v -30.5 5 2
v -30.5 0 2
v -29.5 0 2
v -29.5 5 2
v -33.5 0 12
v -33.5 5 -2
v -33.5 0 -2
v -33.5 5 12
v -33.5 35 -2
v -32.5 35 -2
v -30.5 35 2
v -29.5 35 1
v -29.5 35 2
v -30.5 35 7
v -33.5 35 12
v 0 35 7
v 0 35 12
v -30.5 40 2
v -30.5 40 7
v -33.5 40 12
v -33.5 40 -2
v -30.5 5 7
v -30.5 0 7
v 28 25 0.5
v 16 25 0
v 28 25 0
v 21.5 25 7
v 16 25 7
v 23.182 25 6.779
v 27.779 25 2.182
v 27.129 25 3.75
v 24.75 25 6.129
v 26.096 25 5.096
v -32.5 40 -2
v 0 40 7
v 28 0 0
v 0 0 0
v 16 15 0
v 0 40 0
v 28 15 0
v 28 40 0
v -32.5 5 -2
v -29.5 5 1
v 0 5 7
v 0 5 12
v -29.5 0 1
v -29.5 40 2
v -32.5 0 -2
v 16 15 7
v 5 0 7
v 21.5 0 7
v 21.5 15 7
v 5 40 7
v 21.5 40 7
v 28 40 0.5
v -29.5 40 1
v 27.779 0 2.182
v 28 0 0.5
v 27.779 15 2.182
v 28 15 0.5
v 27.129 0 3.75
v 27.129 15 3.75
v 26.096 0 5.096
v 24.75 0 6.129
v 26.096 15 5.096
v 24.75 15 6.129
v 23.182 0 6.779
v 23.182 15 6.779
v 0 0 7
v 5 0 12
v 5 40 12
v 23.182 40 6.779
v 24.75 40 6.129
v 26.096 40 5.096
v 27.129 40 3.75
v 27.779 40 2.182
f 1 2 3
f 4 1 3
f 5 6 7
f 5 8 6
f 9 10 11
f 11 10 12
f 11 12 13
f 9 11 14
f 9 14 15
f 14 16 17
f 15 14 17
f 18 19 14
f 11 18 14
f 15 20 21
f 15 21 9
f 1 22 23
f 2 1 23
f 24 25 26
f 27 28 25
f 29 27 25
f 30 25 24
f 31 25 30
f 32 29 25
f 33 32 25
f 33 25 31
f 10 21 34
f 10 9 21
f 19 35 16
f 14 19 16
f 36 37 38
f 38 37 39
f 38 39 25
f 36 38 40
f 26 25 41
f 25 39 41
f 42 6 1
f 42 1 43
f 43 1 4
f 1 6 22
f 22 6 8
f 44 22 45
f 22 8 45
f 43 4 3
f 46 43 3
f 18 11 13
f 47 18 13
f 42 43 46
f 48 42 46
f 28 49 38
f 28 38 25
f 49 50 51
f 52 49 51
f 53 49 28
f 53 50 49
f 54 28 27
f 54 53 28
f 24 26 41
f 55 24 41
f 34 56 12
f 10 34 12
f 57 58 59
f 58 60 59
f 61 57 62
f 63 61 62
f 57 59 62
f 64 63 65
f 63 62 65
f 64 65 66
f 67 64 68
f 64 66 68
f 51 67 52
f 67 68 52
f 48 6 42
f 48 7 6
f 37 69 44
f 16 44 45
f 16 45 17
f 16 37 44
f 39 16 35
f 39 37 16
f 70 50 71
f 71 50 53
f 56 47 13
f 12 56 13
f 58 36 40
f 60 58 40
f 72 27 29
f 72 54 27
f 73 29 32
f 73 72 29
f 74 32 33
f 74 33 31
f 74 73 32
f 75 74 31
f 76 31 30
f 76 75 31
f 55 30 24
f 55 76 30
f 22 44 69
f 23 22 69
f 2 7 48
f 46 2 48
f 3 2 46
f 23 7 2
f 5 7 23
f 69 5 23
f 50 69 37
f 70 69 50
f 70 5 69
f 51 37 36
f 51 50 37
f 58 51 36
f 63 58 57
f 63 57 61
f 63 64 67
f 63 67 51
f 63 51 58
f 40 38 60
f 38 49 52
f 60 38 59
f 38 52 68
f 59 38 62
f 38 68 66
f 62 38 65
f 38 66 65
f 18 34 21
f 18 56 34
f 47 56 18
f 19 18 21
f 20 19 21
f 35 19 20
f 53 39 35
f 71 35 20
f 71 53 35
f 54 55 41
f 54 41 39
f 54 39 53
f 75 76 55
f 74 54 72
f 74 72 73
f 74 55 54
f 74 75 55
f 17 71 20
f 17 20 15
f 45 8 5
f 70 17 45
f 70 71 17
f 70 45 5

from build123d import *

# Parameters (mm, degrees)
SKETCH_W     = 28
SKETCH_H     = 40
PAD_DEPTH    = 7
SKETCH001_W  = 5
SKETCH001_H  = 40
PAD001_DEPTH = 5
SKETCH002_W  = 5
SKETCH002_H  = 5
PAD002_DEPTH = 33.5
SKETCH003_W  = 3
SKETCH003_H  = 5
PAD003_DEPTH = 5
SKETCH004_W  = 4
SKETCH004_H  = 5
PAD004_DEPTH = 4
SKETCH005_W  = 12
SKETCH005_H  = 10
POCKET_DEPTH = 9.001
FILLET_R     = 6.5
CHAMFER_SIZE = 3


with BuildPart() as part:
    # Sketch → Pad (new body)
    with BuildSketch(Plane.XY):
        with Locations((14, 20)):
            Rectangle(SKETCH_W, SKETCH_H)
    extrude(amount=PAD_DEPTH)

    # Sketch001 (on Face6 of Pad) → Pad001 (join)
    with BuildSketch(Plane.XY.offset(7)):
        with Locations((2.5, 20)):
            Rectangle(SKETCH001_W, SKETCH001_H)
    extrude(amount=PAD001_DEPTH)

    # Sketch002 (on Face7 of Pad001) → Pad002 (join)
    with BuildSketch(Plane(origin=(0, 0, 0), x_dir=(0, -1, 0), z_dir=(-1, 0, 0))):
        with Locations((-37.5, 9.5)):
            Rectangle(SKETCH002_W, SKETCH002_H)
        with Locations((-2.5, 9.5)):
            Rectangle(SKETCH002_W, SKETCH002_H)
    extrude(amount=PAD002_DEPTH)

    # Sketch003 (on Face9 of Pad002) → Pad003 (join)
    with BuildSketch(Plane(origin=(0, 0, 7), x_dir=(1, 0, 0), z_dir=(0, 0, -1))):
        with Locations((-32, -2.5)):
            Rectangle(SKETCH003_W, SKETCH003_H)
        with Locations((-32, -37.5)):
            Rectangle(SKETCH003_W, SKETCH003_H)
    extrude(amount=PAD003_DEPTH)

    # Sketch004 (on Face10 of Pad003) → Pad004 (join)
    with BuildSketch(Plane(origin=(0, 0, 2), x_dir=(1, 0, 0), z_dir=(0, 0, -1))):
        with Locations((-31.5, -2.5)):
            Rectangle(SKETCH004_W, SKETCH004_H)
        with Locations((-31.5, -37.5)):
            Rectangle(SKETCH004_W, SKETCH004_H)
    extrude(amount=PAD004_DEPTH)

    # Sketch005 (on Face3 of Pad004) → Pocket (cut, through all)
    with BuildSketch(Plane.XY.offset(7)):
        with Locations((22, 20)):
            Rectangle(SKETCH005_W, SKETCH005_H)
    extrude(amount=-POCKET_DEPTH, mode=Mode.SUBTRACT)

    # Fillet
    fillet_edges = [part.edges().sort_by_distance(p)[0] for p in [
        (28, 7.5, 7),
        (28, 32.5, 7),
    ]]
    fillet(fillet_edges, radius=FILLET_R)

    # Chamfer
    chamfer_edges = [part.edges().sort_by_distance(p)[0] for p in [
        (-29.5, 37.5, -2),
        (-29.5, 2.5, -2),
    ]]
    chamfer(chamfer_edges, length=CHAMFER_SIZE)


solid = part.part
